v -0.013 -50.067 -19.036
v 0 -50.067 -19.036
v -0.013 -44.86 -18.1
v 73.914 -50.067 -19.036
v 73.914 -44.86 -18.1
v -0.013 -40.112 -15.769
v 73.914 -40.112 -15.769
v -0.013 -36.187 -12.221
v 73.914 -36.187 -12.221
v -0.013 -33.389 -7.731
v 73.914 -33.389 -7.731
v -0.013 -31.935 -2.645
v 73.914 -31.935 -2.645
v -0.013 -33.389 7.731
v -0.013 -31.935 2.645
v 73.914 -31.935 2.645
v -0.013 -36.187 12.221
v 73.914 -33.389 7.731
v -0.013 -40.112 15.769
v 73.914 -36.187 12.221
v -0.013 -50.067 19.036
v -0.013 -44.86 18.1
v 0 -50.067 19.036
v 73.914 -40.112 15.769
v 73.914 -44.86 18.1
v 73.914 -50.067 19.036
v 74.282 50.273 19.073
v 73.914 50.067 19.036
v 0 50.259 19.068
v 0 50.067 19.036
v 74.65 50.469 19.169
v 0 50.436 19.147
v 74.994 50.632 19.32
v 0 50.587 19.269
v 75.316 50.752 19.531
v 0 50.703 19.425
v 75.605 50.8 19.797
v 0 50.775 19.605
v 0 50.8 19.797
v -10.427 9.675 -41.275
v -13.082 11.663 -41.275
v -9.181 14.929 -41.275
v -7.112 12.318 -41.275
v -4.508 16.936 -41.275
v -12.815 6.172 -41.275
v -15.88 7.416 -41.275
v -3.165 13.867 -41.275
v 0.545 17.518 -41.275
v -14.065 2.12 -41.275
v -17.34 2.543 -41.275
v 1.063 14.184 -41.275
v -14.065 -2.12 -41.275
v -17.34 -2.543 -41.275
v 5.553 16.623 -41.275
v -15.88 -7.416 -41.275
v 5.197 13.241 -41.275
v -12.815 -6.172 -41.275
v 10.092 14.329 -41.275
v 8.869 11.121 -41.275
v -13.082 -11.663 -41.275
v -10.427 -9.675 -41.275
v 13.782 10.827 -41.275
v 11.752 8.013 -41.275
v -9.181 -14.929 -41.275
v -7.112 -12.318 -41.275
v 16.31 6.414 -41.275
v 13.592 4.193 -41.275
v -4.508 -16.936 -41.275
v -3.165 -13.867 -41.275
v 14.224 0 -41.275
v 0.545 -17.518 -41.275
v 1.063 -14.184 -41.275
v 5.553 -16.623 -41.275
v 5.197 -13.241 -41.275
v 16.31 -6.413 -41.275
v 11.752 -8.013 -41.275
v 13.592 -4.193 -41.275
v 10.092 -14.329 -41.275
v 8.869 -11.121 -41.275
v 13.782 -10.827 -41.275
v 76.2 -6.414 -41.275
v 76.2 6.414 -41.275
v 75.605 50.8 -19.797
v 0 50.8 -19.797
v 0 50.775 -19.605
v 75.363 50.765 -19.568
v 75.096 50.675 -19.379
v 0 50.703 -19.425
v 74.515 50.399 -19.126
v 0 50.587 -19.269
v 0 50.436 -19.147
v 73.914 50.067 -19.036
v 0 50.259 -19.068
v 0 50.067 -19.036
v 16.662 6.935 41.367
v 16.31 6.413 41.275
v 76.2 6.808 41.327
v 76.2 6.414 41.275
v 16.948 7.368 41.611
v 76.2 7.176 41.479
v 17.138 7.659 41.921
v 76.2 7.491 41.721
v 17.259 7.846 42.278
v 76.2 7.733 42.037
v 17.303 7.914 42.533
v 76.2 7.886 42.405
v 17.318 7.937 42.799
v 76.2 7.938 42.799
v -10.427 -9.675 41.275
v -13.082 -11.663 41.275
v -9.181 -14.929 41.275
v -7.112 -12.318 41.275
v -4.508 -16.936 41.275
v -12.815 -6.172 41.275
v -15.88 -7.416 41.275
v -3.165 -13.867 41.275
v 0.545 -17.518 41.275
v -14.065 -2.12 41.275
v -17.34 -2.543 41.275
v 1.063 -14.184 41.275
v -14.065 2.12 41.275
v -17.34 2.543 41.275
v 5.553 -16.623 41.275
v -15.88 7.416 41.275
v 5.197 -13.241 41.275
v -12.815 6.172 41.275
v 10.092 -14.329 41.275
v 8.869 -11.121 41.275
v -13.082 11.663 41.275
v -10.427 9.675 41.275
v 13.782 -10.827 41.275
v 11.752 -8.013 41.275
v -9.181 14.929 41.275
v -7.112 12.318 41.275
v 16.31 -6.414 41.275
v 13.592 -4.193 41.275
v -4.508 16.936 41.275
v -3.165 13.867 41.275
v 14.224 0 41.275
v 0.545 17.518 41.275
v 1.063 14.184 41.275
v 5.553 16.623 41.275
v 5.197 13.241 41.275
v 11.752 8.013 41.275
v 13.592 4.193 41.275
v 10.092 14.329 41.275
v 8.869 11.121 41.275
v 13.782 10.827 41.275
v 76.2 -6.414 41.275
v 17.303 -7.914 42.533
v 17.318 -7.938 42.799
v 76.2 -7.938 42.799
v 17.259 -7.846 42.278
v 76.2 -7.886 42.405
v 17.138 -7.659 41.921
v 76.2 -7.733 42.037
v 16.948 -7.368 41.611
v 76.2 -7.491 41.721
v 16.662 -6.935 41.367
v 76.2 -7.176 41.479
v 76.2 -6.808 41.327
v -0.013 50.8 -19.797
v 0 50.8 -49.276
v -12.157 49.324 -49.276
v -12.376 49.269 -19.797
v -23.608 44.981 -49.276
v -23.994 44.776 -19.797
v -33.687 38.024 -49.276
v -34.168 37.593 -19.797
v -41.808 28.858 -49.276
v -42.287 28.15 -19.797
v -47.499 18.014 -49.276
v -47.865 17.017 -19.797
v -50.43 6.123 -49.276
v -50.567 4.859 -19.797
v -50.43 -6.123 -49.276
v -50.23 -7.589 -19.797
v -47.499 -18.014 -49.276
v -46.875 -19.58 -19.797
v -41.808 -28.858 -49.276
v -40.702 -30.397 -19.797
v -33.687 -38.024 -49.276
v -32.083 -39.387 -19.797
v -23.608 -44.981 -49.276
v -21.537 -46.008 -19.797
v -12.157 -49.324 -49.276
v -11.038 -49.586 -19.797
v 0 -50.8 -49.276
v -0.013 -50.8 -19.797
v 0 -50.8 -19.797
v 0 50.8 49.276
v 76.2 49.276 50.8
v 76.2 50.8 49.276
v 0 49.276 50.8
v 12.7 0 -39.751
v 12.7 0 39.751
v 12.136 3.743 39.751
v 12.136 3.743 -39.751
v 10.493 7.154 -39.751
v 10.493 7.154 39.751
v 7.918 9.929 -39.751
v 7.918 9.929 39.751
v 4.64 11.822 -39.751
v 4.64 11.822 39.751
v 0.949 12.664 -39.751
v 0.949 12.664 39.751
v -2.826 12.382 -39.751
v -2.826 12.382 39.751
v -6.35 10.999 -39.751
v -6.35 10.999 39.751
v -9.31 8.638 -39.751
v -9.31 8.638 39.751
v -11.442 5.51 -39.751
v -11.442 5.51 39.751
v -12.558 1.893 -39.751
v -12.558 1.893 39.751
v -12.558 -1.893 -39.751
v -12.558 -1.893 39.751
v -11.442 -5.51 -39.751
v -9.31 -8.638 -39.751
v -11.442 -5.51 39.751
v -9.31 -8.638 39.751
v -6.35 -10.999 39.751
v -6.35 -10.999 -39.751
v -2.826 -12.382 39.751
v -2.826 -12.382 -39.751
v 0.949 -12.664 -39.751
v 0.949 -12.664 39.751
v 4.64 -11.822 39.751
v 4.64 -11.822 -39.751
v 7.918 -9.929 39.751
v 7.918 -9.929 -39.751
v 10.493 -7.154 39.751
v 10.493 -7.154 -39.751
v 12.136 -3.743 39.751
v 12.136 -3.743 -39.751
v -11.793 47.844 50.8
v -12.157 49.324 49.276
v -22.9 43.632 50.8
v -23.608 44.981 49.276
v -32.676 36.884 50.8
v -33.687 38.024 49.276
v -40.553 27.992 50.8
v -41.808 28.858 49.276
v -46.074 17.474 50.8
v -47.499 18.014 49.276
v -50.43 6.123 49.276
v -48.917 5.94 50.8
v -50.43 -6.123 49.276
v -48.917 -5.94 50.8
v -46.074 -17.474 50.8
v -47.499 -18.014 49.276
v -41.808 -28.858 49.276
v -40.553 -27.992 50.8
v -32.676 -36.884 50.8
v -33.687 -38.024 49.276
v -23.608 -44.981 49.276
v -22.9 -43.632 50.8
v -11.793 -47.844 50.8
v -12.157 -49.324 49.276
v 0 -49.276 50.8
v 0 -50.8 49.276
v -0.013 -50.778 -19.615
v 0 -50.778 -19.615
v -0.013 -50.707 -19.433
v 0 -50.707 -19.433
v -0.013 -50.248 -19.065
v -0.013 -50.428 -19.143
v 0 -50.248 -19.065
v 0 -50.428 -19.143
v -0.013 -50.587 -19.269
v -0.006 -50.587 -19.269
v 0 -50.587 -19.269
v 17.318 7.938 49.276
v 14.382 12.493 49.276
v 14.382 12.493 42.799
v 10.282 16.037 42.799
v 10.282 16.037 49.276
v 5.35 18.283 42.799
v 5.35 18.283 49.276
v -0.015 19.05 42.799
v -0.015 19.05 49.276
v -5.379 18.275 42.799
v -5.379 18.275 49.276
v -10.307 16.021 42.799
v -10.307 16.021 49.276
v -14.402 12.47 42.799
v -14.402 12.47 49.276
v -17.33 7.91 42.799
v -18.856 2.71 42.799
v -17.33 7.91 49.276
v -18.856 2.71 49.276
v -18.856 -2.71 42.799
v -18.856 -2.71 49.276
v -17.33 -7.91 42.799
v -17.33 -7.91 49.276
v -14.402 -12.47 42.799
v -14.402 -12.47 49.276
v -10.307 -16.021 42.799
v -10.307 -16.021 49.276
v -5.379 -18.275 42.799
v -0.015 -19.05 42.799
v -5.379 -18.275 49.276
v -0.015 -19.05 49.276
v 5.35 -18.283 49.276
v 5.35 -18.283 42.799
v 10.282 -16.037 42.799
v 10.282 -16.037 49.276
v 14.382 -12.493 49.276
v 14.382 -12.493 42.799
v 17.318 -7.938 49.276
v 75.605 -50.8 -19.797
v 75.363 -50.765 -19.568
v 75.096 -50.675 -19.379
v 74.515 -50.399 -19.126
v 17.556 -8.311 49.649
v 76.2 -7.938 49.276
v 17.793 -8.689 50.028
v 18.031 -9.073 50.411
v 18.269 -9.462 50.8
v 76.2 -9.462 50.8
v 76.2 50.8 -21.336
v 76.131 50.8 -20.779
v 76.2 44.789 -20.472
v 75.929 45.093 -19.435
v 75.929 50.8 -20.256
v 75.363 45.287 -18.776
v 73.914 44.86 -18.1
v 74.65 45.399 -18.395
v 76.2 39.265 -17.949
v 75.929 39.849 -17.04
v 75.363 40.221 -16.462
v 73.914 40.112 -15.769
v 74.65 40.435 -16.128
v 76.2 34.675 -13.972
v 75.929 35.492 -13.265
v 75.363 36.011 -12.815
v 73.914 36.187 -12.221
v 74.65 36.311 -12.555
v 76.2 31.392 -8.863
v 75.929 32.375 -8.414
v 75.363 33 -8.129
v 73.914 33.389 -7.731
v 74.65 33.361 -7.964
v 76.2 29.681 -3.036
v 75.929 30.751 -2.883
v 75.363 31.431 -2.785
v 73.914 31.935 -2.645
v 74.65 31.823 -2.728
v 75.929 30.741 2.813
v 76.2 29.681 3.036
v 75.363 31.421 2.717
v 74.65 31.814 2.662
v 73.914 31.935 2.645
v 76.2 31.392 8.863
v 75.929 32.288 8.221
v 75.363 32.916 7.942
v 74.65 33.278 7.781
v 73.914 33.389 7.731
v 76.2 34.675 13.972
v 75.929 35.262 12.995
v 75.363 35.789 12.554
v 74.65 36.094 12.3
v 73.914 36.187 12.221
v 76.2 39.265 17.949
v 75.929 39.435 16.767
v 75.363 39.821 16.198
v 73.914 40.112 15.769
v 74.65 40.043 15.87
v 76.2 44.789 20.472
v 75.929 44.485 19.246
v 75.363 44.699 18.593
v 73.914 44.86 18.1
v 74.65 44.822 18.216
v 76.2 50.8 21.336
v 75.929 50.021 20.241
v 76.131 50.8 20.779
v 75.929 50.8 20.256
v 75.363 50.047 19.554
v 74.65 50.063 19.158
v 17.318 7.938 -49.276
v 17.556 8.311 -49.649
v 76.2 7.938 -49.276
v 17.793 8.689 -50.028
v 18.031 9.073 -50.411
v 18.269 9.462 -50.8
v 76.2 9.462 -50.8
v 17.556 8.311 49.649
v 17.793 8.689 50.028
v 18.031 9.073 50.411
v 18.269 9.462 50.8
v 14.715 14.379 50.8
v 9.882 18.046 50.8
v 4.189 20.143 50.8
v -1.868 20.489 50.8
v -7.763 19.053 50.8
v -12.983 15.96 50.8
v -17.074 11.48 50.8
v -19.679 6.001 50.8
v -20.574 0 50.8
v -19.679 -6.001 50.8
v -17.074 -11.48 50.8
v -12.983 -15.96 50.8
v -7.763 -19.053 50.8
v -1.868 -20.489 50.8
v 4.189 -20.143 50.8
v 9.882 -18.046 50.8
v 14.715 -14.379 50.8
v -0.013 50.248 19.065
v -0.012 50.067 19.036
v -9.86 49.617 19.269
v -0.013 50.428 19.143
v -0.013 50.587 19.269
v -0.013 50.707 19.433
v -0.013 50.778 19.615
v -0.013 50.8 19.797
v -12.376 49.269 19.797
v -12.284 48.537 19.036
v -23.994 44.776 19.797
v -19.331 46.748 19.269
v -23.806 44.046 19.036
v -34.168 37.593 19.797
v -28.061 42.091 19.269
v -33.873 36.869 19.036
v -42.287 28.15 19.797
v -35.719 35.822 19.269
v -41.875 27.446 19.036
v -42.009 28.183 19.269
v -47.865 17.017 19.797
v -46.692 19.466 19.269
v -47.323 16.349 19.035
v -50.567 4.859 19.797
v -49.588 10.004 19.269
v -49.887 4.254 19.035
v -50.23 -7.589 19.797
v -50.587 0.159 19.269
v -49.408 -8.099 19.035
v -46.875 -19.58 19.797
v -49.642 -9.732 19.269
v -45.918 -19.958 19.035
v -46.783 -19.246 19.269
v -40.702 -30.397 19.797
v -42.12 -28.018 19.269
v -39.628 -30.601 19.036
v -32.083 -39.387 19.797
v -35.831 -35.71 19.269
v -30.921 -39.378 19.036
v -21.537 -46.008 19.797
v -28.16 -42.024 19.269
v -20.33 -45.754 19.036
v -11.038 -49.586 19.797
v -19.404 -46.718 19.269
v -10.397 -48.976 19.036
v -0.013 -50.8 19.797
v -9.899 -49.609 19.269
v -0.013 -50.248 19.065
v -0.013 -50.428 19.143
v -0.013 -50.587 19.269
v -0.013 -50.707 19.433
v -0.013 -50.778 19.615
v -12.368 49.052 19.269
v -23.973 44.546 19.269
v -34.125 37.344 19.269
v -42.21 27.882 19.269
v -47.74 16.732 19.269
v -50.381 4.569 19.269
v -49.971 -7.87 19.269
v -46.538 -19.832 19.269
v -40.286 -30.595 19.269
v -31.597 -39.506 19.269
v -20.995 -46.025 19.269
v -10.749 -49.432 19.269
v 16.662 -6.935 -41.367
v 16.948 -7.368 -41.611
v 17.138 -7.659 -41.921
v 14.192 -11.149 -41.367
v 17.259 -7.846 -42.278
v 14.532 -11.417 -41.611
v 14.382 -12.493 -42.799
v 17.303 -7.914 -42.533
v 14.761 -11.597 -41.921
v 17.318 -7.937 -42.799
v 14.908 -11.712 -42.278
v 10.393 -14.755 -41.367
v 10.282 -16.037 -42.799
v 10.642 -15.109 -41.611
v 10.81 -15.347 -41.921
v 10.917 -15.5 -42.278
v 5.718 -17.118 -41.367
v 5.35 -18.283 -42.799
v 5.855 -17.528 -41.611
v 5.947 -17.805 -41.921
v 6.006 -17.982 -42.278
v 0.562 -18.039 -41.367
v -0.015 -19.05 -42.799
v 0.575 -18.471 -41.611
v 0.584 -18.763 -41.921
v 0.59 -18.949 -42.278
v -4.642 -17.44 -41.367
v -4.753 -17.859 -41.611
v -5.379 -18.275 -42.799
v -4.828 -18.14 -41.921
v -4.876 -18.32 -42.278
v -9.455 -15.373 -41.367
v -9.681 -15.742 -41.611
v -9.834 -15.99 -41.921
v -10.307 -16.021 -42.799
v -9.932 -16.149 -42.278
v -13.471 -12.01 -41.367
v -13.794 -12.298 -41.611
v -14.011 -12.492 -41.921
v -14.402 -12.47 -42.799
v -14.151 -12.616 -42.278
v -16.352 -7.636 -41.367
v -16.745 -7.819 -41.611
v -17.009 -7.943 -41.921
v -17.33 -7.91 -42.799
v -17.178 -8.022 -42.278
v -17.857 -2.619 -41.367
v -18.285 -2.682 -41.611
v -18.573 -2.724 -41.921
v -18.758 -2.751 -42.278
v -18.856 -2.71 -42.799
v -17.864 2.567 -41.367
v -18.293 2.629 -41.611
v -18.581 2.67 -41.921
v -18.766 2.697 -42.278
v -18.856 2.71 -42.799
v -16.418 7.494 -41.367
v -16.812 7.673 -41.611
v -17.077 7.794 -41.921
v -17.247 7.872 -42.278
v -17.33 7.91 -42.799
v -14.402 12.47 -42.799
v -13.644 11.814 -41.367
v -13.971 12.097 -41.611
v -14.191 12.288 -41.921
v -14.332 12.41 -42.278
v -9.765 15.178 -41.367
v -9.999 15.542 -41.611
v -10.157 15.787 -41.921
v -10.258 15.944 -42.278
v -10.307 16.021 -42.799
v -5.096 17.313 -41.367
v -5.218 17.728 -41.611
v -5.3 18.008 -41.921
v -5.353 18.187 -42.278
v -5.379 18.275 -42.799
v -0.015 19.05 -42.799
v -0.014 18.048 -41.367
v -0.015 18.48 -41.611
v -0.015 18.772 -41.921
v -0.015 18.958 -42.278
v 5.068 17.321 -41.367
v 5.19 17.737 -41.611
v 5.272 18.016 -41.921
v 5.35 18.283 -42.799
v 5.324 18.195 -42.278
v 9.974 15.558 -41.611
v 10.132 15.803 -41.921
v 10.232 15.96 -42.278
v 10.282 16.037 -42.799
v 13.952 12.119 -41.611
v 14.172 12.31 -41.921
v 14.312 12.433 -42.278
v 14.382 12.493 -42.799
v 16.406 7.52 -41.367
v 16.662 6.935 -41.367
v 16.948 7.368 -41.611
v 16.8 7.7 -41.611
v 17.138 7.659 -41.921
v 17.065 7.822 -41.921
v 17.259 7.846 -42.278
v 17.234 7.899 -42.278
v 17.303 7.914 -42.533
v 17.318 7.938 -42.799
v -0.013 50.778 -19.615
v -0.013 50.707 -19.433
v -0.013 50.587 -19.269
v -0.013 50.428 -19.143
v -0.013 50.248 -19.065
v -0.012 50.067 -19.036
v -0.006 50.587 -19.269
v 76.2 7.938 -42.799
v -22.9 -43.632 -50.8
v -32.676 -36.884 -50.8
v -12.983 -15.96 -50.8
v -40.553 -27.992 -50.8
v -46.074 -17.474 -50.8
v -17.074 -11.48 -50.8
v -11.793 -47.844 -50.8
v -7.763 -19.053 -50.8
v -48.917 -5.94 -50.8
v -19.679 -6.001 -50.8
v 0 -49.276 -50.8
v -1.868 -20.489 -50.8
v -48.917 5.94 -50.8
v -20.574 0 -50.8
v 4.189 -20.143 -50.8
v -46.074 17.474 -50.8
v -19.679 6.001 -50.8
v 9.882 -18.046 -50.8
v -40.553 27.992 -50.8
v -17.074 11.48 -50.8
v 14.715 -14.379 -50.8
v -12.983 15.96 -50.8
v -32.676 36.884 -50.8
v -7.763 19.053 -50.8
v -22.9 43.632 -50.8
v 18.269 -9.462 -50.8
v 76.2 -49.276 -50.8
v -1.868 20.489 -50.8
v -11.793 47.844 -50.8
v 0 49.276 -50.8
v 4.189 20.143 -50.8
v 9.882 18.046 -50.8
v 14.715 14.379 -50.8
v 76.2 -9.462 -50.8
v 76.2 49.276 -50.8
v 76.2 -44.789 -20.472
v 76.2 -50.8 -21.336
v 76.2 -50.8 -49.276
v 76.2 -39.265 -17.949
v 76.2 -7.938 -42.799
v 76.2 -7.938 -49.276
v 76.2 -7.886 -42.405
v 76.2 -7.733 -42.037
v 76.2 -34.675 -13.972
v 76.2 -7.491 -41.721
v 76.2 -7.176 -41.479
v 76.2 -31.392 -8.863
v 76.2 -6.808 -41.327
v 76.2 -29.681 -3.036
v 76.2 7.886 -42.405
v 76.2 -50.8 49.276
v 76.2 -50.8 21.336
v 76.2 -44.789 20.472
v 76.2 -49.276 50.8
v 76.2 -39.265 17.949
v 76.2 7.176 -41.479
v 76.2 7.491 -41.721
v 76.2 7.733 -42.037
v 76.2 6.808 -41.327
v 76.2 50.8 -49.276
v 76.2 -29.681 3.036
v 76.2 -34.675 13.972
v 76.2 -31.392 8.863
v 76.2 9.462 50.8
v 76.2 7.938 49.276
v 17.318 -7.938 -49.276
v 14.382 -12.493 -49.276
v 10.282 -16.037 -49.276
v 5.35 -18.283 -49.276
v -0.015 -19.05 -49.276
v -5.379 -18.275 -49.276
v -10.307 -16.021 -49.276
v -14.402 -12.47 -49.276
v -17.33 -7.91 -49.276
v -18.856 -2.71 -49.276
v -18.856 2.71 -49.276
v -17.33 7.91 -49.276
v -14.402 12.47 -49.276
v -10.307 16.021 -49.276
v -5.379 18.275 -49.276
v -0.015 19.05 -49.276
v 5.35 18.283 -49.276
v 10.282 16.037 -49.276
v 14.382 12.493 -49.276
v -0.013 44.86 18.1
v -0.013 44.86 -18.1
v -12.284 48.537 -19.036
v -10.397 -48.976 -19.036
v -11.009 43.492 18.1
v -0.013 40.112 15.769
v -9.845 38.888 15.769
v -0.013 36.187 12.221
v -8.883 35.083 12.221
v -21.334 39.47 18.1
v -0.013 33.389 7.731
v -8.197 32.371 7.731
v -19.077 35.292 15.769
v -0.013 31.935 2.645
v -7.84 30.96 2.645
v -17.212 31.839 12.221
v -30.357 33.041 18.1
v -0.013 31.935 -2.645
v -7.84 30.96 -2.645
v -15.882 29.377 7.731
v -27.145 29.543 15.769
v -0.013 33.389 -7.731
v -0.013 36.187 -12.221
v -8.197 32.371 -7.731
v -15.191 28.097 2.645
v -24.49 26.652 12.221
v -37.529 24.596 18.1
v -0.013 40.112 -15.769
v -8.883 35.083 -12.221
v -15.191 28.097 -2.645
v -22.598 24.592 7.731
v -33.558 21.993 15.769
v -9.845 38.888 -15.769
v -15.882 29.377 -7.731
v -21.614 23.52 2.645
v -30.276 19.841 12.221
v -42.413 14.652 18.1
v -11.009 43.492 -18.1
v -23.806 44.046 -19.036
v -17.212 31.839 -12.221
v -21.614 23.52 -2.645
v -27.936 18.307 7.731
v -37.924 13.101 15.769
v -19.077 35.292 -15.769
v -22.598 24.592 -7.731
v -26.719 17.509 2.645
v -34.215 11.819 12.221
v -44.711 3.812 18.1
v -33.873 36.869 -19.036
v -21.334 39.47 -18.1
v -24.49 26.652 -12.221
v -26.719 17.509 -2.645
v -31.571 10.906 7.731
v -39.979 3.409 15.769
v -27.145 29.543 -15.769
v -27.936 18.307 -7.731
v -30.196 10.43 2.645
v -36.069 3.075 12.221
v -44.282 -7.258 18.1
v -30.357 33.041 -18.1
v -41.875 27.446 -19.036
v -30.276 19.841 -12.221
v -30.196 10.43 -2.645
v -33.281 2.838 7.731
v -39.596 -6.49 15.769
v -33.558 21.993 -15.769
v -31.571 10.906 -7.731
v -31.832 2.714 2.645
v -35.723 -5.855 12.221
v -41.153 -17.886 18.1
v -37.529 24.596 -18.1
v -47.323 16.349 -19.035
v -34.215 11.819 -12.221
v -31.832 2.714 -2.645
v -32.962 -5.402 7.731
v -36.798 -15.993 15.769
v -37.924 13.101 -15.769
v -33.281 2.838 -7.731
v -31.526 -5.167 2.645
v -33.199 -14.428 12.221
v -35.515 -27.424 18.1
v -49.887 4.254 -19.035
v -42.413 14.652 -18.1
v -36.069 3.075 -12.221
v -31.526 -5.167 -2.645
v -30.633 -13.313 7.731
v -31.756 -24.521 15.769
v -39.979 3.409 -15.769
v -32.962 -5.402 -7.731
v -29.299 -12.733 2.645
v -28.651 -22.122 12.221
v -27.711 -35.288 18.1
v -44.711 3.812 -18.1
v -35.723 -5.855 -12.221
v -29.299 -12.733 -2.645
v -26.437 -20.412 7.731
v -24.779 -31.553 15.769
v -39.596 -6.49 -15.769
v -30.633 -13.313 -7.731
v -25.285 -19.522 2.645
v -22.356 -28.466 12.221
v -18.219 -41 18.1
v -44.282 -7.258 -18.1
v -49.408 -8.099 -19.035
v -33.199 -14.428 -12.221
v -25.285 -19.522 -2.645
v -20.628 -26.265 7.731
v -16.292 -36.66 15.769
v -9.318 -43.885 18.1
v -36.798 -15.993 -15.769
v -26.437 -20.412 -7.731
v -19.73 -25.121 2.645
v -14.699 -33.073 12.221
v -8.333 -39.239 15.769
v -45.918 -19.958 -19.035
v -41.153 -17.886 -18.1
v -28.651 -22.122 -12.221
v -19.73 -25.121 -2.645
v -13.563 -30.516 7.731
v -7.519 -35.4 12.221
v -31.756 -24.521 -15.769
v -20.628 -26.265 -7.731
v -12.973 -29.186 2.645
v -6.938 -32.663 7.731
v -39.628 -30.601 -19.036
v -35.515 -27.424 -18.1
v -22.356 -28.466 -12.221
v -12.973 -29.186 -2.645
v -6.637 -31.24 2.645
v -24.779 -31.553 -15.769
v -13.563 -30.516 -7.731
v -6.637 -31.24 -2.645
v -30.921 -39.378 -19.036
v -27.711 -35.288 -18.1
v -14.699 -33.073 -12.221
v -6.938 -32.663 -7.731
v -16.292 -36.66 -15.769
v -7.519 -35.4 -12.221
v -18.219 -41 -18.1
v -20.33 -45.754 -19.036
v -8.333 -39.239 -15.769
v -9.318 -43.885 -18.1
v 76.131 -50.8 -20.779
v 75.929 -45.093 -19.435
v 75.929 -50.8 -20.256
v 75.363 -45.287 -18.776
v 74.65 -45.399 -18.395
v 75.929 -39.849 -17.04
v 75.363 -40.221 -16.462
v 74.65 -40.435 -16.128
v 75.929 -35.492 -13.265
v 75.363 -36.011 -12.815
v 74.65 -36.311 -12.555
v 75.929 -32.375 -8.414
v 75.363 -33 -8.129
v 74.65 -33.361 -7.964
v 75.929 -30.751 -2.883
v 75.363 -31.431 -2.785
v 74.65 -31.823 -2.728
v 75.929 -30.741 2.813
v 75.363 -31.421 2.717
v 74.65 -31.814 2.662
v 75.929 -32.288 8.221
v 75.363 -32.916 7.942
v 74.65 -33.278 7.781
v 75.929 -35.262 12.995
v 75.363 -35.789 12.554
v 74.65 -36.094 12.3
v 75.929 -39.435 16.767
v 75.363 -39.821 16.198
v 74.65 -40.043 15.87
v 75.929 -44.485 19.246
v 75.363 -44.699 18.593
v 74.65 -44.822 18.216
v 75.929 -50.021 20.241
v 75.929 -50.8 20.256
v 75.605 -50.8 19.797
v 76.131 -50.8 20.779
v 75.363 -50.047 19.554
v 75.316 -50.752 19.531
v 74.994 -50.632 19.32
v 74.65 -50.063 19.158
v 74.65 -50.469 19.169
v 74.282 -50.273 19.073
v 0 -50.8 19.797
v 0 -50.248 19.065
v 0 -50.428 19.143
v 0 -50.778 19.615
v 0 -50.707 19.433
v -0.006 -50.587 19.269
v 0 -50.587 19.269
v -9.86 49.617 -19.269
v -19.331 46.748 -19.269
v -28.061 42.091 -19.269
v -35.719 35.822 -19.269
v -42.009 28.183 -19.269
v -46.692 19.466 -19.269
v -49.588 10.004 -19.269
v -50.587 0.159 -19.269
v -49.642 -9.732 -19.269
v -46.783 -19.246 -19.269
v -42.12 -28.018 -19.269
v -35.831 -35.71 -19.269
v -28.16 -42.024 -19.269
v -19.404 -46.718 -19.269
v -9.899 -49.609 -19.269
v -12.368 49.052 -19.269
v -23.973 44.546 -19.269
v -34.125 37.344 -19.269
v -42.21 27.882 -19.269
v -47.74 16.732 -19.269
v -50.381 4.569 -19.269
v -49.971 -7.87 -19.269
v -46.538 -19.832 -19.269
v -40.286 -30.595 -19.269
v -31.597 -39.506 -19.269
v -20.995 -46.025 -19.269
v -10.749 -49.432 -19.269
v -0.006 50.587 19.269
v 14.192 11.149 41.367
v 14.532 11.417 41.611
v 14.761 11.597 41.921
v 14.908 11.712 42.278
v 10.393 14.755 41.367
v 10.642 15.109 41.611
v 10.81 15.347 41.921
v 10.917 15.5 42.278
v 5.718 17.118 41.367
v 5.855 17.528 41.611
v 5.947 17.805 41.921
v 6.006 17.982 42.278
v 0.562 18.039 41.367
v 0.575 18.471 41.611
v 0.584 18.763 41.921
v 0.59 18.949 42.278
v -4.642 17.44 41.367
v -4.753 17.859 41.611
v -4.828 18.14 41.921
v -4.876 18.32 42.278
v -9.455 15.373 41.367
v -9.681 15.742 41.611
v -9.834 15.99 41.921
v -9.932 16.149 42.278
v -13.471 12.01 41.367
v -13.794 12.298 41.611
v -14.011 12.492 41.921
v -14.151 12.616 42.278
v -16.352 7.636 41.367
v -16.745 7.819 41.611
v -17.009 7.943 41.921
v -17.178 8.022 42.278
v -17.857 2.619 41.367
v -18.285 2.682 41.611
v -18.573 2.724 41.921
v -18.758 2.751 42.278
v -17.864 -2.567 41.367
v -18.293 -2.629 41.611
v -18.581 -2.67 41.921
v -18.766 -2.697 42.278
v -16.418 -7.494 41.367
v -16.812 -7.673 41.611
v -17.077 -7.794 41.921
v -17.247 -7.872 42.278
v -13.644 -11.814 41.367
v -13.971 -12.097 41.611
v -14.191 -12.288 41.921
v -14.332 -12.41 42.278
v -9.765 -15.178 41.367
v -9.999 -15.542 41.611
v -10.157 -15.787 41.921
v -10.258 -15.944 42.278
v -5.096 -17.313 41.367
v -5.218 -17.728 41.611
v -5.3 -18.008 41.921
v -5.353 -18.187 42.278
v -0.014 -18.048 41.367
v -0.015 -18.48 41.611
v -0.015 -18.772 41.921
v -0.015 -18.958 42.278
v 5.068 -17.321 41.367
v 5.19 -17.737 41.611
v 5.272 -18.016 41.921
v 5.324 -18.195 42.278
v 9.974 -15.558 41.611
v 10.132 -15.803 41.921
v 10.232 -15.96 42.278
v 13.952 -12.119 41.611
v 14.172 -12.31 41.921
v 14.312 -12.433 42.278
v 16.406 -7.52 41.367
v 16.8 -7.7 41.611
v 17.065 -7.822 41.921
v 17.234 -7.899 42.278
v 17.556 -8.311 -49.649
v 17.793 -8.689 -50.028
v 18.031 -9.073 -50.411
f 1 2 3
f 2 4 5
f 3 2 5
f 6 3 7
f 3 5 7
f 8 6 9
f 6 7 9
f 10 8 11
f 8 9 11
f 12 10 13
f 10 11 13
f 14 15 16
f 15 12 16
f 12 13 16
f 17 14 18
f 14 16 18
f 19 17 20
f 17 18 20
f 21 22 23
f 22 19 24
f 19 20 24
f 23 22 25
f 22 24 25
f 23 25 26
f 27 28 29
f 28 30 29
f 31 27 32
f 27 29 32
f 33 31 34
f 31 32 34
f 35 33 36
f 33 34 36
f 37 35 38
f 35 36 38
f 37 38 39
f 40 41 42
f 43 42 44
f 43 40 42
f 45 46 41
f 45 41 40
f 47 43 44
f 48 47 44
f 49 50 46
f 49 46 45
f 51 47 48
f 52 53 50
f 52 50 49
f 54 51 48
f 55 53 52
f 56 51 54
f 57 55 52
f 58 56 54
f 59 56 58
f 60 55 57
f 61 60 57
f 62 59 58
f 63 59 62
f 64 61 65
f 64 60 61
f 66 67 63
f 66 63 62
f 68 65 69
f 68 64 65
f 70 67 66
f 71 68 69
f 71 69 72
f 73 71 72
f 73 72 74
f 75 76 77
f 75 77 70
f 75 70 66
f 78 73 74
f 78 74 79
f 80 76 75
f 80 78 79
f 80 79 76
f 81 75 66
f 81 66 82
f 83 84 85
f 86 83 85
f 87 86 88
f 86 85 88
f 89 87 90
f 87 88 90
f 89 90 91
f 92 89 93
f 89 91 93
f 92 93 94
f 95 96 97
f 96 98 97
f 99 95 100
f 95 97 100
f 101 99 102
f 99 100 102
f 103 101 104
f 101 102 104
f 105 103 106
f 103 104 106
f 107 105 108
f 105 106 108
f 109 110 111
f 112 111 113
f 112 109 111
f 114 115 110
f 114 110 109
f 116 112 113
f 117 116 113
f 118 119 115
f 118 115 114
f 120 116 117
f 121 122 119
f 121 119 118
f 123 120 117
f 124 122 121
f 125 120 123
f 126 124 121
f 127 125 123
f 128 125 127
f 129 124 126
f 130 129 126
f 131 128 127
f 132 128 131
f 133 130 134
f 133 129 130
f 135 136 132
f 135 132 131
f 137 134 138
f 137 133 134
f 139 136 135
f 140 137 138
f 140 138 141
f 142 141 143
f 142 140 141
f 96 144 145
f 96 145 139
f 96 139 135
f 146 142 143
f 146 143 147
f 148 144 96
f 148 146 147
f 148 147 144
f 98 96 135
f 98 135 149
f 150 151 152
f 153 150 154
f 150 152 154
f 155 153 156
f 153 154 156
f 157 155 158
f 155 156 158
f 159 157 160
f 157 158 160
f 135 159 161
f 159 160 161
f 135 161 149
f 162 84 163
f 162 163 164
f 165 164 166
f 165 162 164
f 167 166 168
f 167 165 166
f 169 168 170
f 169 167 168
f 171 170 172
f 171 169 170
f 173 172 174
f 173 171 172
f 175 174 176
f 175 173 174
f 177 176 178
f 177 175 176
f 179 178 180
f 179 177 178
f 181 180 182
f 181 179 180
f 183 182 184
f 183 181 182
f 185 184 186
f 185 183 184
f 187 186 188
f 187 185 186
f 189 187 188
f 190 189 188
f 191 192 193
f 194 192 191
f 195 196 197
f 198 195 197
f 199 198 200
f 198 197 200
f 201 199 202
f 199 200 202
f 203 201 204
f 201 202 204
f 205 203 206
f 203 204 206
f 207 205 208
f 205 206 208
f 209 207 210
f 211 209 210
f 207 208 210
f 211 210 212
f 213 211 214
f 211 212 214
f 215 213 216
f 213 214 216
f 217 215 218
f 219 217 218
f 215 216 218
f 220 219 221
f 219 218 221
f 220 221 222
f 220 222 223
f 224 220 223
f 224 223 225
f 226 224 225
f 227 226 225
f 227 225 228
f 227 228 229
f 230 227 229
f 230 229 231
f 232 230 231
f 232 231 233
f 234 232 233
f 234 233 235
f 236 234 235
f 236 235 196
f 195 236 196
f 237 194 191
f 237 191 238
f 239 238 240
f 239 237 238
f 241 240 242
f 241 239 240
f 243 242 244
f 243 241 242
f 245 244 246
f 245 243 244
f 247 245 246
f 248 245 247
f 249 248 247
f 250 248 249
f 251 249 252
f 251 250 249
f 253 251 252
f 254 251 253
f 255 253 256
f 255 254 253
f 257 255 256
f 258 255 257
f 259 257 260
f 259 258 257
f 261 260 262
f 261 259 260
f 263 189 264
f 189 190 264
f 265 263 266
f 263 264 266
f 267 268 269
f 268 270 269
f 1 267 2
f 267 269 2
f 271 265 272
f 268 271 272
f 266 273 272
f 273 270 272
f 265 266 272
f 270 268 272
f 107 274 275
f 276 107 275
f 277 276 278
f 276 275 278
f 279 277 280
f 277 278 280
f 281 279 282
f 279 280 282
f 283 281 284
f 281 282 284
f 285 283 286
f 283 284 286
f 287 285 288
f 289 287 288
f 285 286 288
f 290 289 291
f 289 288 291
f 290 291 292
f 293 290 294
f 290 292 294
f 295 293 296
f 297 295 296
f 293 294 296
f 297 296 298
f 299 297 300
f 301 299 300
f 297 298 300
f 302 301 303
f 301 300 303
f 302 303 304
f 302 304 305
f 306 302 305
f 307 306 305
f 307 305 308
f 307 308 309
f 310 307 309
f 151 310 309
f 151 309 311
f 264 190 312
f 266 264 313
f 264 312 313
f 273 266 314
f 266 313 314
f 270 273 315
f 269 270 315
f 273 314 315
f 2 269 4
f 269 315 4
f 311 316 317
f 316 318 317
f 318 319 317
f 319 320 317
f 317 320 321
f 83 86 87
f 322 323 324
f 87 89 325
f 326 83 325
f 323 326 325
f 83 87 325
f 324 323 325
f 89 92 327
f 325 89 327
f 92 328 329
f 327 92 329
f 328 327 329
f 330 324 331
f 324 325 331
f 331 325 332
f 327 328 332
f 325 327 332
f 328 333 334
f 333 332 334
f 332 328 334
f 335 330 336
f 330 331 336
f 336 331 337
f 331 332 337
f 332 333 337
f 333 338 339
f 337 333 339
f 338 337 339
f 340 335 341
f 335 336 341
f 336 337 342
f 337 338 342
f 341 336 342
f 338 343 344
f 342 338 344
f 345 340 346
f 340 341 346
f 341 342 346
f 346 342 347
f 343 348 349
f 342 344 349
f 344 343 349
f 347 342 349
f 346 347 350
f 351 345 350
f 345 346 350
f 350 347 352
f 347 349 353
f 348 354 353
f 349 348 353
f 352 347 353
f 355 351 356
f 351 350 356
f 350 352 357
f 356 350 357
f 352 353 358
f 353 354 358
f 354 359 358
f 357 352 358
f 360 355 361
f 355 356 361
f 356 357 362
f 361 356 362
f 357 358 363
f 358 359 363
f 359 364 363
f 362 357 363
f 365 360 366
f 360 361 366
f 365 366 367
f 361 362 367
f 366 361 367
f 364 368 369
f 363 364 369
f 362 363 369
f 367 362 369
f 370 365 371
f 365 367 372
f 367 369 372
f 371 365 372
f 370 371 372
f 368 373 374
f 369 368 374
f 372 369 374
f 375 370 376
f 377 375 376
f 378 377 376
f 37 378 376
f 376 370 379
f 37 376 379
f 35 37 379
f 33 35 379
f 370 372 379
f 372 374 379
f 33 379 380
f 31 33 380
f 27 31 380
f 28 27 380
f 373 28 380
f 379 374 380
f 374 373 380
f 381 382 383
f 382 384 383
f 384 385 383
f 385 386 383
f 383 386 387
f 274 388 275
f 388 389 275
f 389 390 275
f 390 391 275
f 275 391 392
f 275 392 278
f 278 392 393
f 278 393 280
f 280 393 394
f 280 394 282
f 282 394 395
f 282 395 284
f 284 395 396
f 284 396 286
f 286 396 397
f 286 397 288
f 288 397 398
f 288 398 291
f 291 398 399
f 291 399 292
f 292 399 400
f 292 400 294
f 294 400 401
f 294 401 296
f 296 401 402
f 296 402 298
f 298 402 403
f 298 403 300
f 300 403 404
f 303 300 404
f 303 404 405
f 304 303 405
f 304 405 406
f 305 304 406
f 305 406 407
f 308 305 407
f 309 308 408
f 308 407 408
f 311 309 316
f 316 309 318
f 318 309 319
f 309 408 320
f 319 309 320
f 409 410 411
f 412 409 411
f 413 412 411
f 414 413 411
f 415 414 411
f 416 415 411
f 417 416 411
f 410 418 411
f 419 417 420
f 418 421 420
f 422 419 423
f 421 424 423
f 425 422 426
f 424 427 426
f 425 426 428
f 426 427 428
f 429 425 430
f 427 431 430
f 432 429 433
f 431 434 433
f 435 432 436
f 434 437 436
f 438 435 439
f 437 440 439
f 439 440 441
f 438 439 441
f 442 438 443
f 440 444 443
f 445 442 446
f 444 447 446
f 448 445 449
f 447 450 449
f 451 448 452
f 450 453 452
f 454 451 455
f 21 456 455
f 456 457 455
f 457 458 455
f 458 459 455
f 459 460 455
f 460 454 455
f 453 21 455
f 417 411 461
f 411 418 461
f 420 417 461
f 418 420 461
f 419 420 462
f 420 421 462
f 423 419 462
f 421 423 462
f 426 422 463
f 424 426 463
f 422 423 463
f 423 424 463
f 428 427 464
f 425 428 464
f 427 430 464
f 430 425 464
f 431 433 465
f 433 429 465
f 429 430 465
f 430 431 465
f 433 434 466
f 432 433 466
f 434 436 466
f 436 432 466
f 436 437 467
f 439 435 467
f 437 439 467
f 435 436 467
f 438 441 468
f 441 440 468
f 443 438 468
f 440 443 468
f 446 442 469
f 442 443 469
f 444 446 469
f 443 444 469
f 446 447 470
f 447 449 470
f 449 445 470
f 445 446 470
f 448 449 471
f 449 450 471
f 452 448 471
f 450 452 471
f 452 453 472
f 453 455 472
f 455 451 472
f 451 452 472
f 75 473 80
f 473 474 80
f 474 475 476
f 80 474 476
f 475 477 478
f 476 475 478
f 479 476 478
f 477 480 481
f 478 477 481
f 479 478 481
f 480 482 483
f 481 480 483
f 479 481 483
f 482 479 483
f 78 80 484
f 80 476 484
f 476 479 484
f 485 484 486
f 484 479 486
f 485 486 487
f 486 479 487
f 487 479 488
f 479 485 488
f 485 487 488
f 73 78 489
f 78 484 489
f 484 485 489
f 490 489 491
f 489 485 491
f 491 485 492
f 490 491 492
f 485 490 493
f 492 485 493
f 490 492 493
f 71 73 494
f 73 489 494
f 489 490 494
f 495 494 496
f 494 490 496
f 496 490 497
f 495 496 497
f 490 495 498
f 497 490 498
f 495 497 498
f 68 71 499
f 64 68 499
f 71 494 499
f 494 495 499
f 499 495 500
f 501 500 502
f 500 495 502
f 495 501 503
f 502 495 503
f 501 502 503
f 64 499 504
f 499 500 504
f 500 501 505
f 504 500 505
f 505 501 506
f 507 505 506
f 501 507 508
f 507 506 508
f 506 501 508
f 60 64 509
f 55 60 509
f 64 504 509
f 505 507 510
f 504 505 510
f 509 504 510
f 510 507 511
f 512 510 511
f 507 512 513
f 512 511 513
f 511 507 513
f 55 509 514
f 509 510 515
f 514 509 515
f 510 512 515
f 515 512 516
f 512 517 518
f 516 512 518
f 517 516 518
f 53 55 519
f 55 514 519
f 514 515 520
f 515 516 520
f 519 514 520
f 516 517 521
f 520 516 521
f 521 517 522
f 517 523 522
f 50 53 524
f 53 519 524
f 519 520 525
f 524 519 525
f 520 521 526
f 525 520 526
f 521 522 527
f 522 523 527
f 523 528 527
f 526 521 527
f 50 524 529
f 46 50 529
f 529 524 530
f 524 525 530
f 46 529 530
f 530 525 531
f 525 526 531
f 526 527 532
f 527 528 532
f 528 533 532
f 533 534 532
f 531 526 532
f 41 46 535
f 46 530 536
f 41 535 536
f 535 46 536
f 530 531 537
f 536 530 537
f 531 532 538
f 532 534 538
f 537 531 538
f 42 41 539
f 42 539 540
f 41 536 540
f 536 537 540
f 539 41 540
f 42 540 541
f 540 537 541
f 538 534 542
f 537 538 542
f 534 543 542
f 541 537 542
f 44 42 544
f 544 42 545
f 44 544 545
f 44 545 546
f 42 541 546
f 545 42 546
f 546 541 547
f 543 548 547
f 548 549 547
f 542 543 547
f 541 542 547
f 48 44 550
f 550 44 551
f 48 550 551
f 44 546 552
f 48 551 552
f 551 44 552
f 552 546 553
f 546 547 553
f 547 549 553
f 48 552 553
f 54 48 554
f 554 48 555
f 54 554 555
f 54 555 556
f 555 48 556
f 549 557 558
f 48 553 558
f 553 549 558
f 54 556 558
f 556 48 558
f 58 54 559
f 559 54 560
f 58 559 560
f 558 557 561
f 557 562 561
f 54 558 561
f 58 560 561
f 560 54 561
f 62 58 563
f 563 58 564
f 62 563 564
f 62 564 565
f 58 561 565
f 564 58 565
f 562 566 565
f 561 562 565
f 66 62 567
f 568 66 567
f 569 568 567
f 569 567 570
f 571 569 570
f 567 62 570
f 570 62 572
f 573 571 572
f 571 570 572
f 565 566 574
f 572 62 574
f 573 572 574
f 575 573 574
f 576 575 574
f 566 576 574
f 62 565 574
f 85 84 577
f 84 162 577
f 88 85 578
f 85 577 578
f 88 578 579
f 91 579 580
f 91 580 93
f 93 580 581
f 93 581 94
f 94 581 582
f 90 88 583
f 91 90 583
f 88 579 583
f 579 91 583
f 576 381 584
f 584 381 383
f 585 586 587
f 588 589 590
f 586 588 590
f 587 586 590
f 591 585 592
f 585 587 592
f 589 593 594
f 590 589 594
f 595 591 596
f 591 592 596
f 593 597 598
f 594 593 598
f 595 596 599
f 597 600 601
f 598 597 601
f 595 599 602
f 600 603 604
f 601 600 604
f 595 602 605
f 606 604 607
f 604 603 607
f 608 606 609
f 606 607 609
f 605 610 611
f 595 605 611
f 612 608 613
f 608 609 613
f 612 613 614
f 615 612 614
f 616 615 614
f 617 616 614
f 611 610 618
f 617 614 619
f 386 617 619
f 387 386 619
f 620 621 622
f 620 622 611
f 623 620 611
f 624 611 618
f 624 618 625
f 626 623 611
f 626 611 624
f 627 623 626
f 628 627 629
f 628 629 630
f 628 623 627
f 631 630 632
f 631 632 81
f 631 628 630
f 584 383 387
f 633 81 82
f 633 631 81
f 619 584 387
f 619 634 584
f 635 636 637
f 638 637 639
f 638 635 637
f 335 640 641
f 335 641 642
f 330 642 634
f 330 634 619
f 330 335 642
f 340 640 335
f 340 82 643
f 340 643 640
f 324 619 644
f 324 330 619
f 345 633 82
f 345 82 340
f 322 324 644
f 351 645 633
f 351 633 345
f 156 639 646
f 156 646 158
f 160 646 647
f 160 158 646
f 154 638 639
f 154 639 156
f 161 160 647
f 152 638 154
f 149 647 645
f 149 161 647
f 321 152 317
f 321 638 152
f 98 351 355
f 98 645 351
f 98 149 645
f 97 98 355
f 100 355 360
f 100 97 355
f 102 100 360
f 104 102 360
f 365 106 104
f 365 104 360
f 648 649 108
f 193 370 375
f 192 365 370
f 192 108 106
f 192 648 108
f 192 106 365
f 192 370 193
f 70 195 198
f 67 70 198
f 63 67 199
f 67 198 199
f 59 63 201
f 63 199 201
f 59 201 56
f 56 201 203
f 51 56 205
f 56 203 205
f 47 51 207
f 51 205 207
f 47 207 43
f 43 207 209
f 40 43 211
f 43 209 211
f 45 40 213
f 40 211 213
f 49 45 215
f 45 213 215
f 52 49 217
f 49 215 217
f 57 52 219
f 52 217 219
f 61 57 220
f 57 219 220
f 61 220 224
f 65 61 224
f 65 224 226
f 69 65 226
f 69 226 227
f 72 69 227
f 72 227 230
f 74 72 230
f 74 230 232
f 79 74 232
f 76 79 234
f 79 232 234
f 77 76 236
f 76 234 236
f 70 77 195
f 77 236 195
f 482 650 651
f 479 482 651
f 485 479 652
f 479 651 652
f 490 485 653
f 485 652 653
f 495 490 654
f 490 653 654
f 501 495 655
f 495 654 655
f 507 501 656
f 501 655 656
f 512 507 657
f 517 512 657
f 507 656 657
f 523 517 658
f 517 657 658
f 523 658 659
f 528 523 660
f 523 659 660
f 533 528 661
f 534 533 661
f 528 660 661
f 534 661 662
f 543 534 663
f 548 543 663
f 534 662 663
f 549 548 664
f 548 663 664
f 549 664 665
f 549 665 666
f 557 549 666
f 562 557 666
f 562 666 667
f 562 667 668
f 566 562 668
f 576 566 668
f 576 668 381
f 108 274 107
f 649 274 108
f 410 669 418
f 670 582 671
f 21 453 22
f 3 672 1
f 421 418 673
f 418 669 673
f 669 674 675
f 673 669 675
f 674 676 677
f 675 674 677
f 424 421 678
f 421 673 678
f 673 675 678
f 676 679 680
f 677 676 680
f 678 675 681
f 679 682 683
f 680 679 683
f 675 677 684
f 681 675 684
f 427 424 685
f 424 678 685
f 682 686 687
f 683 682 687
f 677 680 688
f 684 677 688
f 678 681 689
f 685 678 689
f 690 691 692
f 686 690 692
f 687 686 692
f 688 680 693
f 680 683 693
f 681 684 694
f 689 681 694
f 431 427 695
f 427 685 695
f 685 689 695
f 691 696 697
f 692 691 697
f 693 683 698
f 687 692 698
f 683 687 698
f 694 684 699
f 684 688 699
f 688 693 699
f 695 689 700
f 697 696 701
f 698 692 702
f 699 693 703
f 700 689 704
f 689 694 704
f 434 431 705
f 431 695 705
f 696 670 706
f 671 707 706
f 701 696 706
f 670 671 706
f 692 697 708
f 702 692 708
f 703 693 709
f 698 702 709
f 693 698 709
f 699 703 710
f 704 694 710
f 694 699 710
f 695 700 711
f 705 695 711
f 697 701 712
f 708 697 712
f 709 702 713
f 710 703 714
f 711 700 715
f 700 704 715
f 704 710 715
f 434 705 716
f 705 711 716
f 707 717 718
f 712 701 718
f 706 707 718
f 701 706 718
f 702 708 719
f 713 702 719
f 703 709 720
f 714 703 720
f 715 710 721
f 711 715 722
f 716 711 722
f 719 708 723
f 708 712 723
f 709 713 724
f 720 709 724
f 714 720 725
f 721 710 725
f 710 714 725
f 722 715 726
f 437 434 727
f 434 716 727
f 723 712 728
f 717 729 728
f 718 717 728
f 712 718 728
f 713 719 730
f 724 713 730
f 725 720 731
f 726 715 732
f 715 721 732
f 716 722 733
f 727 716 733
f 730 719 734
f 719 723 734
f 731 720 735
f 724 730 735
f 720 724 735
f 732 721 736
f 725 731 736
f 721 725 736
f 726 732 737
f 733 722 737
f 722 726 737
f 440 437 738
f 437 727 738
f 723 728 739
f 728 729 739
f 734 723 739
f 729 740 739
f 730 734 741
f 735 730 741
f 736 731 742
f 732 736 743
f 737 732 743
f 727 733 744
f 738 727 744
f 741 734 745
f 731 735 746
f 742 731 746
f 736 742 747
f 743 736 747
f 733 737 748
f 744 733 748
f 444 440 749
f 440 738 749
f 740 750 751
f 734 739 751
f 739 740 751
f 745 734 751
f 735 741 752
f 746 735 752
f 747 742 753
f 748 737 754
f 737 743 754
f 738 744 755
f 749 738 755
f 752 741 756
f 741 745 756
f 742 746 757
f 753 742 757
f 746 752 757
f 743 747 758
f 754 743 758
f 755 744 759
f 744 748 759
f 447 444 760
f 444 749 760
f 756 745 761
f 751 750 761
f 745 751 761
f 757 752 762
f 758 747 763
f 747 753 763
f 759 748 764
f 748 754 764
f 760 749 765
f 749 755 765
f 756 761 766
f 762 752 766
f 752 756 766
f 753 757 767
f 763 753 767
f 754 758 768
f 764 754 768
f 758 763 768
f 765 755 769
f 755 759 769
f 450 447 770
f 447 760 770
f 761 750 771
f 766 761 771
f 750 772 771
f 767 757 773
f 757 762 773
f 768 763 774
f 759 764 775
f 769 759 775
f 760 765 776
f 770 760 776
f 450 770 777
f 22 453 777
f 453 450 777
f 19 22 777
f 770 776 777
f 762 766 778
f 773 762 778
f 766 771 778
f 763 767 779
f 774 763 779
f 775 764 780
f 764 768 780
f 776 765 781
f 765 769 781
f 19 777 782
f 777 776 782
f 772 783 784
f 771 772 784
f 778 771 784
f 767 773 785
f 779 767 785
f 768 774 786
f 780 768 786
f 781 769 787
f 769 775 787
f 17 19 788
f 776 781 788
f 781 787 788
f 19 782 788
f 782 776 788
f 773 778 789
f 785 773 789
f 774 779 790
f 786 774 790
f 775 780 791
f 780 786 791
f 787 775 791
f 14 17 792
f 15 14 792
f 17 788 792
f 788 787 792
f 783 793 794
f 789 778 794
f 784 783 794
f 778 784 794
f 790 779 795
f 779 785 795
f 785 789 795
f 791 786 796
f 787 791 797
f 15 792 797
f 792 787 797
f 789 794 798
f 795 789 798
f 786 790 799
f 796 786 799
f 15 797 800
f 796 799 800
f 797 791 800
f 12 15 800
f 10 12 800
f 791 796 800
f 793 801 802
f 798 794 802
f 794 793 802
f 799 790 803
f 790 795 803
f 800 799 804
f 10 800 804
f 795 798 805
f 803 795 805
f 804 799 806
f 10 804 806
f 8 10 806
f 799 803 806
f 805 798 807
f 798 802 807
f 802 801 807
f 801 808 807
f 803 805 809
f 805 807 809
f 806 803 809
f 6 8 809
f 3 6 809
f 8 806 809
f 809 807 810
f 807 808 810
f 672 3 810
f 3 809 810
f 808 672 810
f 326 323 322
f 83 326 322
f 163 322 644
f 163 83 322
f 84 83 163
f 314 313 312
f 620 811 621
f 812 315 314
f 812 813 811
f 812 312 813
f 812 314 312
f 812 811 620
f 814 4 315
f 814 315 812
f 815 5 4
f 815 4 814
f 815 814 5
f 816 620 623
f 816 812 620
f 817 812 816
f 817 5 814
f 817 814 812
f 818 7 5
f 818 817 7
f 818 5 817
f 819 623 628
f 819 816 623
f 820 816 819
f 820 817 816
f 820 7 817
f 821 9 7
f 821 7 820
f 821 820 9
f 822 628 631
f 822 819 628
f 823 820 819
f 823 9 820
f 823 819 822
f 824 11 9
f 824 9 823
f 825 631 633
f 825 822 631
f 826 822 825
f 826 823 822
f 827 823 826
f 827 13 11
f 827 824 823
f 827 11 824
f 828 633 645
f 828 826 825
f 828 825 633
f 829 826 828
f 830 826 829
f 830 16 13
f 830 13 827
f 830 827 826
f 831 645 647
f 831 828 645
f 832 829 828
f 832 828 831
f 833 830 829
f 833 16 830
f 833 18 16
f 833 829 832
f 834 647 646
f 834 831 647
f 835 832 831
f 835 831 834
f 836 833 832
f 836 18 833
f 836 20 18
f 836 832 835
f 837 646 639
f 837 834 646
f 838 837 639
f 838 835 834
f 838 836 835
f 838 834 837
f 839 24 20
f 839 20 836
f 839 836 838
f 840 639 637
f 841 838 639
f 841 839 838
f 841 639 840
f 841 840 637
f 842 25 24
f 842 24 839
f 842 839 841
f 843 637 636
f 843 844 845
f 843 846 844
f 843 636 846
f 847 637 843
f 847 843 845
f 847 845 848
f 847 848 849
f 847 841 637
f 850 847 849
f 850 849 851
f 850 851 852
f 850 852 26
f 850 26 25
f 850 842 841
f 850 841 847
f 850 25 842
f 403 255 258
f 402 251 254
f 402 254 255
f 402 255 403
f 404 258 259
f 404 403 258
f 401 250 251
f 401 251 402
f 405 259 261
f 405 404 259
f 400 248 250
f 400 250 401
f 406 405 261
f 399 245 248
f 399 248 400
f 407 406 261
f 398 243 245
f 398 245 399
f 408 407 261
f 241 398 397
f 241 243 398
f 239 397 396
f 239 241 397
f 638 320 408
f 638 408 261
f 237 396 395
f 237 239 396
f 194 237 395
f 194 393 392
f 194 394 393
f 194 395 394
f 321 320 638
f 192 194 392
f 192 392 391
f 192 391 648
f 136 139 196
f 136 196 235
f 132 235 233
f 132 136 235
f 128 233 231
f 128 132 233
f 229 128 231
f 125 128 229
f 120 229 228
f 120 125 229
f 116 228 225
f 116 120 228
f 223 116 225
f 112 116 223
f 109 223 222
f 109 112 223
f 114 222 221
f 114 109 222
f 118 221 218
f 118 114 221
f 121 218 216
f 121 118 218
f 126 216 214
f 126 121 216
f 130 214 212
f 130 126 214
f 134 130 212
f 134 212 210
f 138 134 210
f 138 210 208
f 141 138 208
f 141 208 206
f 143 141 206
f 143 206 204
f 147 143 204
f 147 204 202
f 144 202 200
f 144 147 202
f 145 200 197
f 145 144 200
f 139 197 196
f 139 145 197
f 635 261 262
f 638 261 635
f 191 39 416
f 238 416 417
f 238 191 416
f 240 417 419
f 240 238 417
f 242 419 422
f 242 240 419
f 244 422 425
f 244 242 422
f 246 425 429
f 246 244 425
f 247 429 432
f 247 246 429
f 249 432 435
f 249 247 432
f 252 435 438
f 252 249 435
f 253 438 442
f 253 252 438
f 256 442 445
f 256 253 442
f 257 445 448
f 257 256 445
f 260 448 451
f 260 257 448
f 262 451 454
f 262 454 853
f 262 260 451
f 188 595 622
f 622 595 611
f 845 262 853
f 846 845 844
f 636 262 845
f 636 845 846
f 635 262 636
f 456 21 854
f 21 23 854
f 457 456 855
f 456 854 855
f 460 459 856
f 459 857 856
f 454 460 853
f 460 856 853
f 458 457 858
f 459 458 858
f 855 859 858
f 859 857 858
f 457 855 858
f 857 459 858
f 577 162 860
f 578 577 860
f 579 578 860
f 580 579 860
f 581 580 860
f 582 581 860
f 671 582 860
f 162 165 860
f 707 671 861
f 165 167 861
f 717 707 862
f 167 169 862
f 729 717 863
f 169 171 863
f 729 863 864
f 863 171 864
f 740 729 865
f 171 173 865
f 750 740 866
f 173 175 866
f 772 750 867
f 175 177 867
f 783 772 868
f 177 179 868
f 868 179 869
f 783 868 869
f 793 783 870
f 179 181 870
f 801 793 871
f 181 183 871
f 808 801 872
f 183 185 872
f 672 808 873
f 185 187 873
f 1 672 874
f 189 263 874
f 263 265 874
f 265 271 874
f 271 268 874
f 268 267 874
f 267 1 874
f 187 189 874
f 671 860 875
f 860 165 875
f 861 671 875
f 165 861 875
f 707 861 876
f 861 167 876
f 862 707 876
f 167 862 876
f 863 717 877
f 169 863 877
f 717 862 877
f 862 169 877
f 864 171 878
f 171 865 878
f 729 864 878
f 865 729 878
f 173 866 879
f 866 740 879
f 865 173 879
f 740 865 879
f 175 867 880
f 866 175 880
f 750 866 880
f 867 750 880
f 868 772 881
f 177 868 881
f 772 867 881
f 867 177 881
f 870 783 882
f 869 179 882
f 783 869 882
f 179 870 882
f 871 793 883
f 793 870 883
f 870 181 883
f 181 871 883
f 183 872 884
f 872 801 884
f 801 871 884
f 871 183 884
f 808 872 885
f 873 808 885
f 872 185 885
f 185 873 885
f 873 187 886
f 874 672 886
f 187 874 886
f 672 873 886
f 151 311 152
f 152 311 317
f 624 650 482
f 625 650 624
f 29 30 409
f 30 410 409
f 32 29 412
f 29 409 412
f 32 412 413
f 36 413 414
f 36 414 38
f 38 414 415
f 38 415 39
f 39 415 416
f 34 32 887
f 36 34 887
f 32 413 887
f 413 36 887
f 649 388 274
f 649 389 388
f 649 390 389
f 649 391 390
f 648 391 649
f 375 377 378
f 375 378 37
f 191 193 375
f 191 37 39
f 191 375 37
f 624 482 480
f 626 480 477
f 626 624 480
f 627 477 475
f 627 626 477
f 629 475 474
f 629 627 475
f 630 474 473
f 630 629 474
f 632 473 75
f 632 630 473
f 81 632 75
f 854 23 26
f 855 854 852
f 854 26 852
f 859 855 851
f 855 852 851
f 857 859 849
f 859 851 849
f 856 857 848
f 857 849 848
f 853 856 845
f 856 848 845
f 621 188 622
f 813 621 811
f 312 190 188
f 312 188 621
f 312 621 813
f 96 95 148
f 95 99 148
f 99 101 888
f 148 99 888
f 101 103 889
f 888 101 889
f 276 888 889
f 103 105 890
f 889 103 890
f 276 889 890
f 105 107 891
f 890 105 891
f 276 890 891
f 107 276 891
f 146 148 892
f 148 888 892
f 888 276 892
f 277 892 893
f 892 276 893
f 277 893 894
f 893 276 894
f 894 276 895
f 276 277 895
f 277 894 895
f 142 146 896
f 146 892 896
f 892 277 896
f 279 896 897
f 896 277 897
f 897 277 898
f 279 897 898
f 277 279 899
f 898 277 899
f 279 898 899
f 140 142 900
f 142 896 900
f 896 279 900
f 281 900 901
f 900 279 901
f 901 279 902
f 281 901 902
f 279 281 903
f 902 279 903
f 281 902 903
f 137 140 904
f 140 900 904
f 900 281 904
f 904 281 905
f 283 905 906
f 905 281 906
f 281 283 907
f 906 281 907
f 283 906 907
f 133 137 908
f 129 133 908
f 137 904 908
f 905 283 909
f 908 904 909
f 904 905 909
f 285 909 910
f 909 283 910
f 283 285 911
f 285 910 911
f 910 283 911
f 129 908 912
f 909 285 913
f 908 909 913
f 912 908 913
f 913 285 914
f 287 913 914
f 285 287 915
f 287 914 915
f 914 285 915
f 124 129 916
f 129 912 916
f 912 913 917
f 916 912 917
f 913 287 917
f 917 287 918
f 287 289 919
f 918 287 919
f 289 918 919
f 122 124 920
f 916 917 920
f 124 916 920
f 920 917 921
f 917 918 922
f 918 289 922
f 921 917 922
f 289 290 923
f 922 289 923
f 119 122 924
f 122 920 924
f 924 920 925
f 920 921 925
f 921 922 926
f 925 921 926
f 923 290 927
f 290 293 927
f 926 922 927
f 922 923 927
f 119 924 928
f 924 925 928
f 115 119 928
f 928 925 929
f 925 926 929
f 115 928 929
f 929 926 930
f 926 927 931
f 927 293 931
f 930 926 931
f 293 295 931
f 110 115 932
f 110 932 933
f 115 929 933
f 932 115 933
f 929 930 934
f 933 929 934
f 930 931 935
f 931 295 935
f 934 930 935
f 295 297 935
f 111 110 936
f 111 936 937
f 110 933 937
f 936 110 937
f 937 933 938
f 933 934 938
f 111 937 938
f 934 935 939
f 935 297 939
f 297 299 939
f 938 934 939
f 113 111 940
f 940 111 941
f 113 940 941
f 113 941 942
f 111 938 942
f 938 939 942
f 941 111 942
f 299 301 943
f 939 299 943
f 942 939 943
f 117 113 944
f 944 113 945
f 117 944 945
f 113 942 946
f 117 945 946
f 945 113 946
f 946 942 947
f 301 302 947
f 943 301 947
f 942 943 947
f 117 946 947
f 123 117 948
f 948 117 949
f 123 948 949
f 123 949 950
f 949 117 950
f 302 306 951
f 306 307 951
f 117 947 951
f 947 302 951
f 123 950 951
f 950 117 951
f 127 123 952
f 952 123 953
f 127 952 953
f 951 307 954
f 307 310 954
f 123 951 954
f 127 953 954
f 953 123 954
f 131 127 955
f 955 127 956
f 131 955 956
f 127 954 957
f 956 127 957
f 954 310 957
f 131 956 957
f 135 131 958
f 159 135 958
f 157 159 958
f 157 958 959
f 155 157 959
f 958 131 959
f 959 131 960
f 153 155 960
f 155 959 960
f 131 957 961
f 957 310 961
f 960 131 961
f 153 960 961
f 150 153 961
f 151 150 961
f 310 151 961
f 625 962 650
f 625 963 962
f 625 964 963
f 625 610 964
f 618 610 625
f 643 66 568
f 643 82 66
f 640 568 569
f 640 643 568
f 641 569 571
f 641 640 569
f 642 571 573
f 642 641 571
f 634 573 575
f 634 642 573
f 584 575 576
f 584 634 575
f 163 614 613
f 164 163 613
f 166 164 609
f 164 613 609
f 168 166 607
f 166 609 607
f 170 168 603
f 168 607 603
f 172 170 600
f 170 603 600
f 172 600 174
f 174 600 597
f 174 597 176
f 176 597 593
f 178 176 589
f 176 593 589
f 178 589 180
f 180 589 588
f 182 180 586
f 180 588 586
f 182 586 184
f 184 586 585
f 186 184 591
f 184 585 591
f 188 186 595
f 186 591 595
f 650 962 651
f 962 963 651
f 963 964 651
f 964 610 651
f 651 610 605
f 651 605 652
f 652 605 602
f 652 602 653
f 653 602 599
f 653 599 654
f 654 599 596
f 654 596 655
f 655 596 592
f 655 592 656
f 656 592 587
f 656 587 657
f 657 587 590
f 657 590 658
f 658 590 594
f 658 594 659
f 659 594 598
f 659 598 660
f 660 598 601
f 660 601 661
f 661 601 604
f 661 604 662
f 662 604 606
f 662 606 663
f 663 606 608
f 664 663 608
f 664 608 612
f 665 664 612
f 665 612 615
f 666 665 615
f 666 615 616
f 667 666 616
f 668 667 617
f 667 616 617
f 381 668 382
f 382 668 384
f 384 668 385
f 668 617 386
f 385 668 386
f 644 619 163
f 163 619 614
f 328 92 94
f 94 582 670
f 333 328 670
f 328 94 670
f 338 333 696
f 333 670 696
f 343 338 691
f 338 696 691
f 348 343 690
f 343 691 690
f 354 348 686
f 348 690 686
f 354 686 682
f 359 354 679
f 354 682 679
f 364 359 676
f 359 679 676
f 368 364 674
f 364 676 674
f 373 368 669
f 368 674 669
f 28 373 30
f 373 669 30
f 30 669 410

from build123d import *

# Parameters (mm, degrees)
F1_DEPTH     = 50.8
F4_R         = 19.05
F6_R         = 12.7
F7_DEPTH     = 101.6010001
F8_R         = 19.05
F9_DEPTH     = 9.525
F10_R        = 19.05
F11_DEPTH    = 9.525
F12_SIZE     = 1.524
F13_R        = 0.762
F14_T2_ANGLE = 210.0216204264
F14_T4_ANGLE = 210.0216204264
F15_W        = 76.2
F15_H        = 15.875
F16_DEPTH    = 9.525
F17_W        = 76.2
F17_H        = 15.875
F18_DEPTH    = 9.525
F19_SIZE     = 1.524
F20_R        = 1.524


# Not quite as in the source:
# - a fillet or chamfer that OpenCascade refuses, or shapes differently, is made with other operations: its cross-section is extruded or revolved along the edge and cut away or added


with BuildPart() as f1:
    # F0 (on Top) → F1 (new body, symmetric)
    with BuildSketch(Plane.XY):
        with BuildLine():
            Line((76.2, 50.8), (0, 50.8))
            ThreePointArc((0, 50.8), (-50.8, 0), (0, -50.8))
            Line((0, -50.8), (76.2, -50.8))
            Line((76.2, -50.8), (76.2, 50.8))
        make_face()
    extrude(amount=F1_DEPTH, both=True)

    # F5: sweep along a path in F2
    with BuildLine(Plane.XY) as f5_path:
        Line((88.8873545716, 50.8), (-0.0126454284, 50.8))
        ThreePointArc((-0.0126454284, 50.8), (-50.8126454284, 0), (-0.0126454284, -50.8))
        Line((-0.0126454284, -50.8), (88.8873545716, -50.8))
    # F4 (on line) → F5 (sweep, cut)
    with BuildSketch(Plane.YZ.offset(88.8873545716)):
        with Locations((50.8, 0)):
            Circle(F4_R)
    sweep(path=f5_path.line, mode=Mode.SUBTRACT)

    # F6 (on face) → F7 (cut, through all)
    with BuildSketch(Plane.XY.offset(50.8)):
        Circle(F6_R)
    extrude(amount=-F7_DEPTH, mode=Mode.SUBTRACT)

    # F8 (on face) → F9 (cut)
    with BuildSketch(Plane.XY.offset(50.8)):
        Circle(F8_R)
    extrude(amount=-F9_DEPTH, mode=Mode.SUBTRACT)

    # F10 (on face) → F11 (cut)
    with BuildSketch(Plane(origin=(0, 0, -50.8), x_dir=(1, 0, 0), z_dir=(0, 0, -1))):
        Circle(F10_R)
    extrude(amount=-F11_DEPTH, mode=Mode.SUBTRACT)

    # F12
    f12_edges = [f1.edges().sort_by_distance(p)[0] for p in [
        (38.1, -50.8, 50.8),
        (38.1, 50.8, -50.8),
    ]]
    chamfer(f12_edges, length=F12_SIZE)

    # F13
    f13_edges = [f1.edges().sort_by_distance(p)[0] for p in [
        (38.1, -50.8, -19.05),
        (38.1, -50.8, 19.05),
        (-0.006323, 50.799999, -19.05),
        (-50.8, 0, -19.049996),
        (-0.006323, -50.799999, -19.05),
        (-0.006323, -50.799999, 19.05),
        (38.1, 50.8, -19.05),
        (-0.006323, 50.799999, 19.05),
        (38.1, 50.8, 19.05),
        (-50.8, 0, 19.049996),
    ]]
    fillet(f13_edges, radius=F13_R)

    # F14: fillet of radius 2.286 on 2 edges, made by hand

    # F14_s1 → F14_t2 (revolve, cut)
    with BuildSketch(Plane(origin=(0, 47.3922513753, 12.7082996284), x_dir=(1, 0, 0), z_dir=(0, 0.9658769767, 0.2590012854))):
        with BuildLine():
            ThreePointArc((76.2, 34.4932652985), (75.5304461018, 32.8768191967), (73.914, 32.2072652985))
            Line((73.914, 32.2072652985), (76.2, 32.2072652985))
            Line((76.2, 32.2072652985), (76.2, 34.4932652985))
        make_face()
    revolve(axis=Axis((76.2, 50.8, 0), (-1, 0, 0)), revolution_arc=F14_T2_ANGLE, mode=Mode.SUBTRACT)

    # F14_s3 → F14_t4 (revolve, cut)
    with BuildSketch(Plane(origin=(0, -47.3922513753, 12.7082996284), x_dir=(1, 0, 0), z_dir=(0, -0.9658769767, 0.2590012854))):
        with BuildLine():
            ThreePointArc((76.2, -34.4932652985), (75.5304461018, -32.8768191967), (73.914, -32.2072652985))
            Line((73.914, -32.2072652985), (76.2, -32.2072652985))
            Line((76.2, -32.2072652985), (76.2, -34.4932652985))
        make_face()
    revolve(axis=Axis((76.2, -50.8, 0), (1, 0, 0)), revolution_arc=F14_T4_ANGLE, mode=Mode.SUBTRACT)

    # F15 (on face) → F16 (cut)
    with BuildSketch(Plane(origin=(0, 0, -50.8), x_dir=(1, 0, 0), z_dir=(0, 0, -1))):
        with Locations((38.1, 0)):
            Rectangle(F15_W, F15_H)
    extrude(amount=-F16_DEPTH, mode=Mode.SUBTRACT)

    # F17 (on face) → F18 (cut)
    with BuildSketch(Plane.XY.offset(50.8)):
        with Locations((38.1, 0)):
            Rectangle(F17_W, F17_H)
    extrude(amount=-F18_DEPTH, mode=Mode.SUBTRACT)

    # F19
    f19_edges = [f1.edges().sort_by_distance(p)[0] for p in [
        (-19.05, 0, 50.8),
        (46.75879, 7.9375, 50.8),
        (46.75879, -7.9375, 50.8),
        (-12.7, 0, 41.275),
        (-19.05, 0, -50.8),
        (-12.7, 0, -41.275),
        (46.75879, -7.9375, -50.8),
        (46.75879, 7.9375, -50.8),
    ]]
    chamfer(f19_edges, length=F19_SIZE)

    # F20
    f20_edges = [f1.edges().sort_by_distance(p)[0] for p in [
        (-19.05, 0, -41.275),
        (46.75879, -7.9375, -41.275),
        (46.75879, 7.9375, -41.275),
        (-19.05, 0, 41.275),
        (46.75879, 7.9375, 41.275),
        (46.75879, -7.9375, 41.275),
    ]]
    fillet(f20_edges, radius=F20_R)


solid = f1.part
